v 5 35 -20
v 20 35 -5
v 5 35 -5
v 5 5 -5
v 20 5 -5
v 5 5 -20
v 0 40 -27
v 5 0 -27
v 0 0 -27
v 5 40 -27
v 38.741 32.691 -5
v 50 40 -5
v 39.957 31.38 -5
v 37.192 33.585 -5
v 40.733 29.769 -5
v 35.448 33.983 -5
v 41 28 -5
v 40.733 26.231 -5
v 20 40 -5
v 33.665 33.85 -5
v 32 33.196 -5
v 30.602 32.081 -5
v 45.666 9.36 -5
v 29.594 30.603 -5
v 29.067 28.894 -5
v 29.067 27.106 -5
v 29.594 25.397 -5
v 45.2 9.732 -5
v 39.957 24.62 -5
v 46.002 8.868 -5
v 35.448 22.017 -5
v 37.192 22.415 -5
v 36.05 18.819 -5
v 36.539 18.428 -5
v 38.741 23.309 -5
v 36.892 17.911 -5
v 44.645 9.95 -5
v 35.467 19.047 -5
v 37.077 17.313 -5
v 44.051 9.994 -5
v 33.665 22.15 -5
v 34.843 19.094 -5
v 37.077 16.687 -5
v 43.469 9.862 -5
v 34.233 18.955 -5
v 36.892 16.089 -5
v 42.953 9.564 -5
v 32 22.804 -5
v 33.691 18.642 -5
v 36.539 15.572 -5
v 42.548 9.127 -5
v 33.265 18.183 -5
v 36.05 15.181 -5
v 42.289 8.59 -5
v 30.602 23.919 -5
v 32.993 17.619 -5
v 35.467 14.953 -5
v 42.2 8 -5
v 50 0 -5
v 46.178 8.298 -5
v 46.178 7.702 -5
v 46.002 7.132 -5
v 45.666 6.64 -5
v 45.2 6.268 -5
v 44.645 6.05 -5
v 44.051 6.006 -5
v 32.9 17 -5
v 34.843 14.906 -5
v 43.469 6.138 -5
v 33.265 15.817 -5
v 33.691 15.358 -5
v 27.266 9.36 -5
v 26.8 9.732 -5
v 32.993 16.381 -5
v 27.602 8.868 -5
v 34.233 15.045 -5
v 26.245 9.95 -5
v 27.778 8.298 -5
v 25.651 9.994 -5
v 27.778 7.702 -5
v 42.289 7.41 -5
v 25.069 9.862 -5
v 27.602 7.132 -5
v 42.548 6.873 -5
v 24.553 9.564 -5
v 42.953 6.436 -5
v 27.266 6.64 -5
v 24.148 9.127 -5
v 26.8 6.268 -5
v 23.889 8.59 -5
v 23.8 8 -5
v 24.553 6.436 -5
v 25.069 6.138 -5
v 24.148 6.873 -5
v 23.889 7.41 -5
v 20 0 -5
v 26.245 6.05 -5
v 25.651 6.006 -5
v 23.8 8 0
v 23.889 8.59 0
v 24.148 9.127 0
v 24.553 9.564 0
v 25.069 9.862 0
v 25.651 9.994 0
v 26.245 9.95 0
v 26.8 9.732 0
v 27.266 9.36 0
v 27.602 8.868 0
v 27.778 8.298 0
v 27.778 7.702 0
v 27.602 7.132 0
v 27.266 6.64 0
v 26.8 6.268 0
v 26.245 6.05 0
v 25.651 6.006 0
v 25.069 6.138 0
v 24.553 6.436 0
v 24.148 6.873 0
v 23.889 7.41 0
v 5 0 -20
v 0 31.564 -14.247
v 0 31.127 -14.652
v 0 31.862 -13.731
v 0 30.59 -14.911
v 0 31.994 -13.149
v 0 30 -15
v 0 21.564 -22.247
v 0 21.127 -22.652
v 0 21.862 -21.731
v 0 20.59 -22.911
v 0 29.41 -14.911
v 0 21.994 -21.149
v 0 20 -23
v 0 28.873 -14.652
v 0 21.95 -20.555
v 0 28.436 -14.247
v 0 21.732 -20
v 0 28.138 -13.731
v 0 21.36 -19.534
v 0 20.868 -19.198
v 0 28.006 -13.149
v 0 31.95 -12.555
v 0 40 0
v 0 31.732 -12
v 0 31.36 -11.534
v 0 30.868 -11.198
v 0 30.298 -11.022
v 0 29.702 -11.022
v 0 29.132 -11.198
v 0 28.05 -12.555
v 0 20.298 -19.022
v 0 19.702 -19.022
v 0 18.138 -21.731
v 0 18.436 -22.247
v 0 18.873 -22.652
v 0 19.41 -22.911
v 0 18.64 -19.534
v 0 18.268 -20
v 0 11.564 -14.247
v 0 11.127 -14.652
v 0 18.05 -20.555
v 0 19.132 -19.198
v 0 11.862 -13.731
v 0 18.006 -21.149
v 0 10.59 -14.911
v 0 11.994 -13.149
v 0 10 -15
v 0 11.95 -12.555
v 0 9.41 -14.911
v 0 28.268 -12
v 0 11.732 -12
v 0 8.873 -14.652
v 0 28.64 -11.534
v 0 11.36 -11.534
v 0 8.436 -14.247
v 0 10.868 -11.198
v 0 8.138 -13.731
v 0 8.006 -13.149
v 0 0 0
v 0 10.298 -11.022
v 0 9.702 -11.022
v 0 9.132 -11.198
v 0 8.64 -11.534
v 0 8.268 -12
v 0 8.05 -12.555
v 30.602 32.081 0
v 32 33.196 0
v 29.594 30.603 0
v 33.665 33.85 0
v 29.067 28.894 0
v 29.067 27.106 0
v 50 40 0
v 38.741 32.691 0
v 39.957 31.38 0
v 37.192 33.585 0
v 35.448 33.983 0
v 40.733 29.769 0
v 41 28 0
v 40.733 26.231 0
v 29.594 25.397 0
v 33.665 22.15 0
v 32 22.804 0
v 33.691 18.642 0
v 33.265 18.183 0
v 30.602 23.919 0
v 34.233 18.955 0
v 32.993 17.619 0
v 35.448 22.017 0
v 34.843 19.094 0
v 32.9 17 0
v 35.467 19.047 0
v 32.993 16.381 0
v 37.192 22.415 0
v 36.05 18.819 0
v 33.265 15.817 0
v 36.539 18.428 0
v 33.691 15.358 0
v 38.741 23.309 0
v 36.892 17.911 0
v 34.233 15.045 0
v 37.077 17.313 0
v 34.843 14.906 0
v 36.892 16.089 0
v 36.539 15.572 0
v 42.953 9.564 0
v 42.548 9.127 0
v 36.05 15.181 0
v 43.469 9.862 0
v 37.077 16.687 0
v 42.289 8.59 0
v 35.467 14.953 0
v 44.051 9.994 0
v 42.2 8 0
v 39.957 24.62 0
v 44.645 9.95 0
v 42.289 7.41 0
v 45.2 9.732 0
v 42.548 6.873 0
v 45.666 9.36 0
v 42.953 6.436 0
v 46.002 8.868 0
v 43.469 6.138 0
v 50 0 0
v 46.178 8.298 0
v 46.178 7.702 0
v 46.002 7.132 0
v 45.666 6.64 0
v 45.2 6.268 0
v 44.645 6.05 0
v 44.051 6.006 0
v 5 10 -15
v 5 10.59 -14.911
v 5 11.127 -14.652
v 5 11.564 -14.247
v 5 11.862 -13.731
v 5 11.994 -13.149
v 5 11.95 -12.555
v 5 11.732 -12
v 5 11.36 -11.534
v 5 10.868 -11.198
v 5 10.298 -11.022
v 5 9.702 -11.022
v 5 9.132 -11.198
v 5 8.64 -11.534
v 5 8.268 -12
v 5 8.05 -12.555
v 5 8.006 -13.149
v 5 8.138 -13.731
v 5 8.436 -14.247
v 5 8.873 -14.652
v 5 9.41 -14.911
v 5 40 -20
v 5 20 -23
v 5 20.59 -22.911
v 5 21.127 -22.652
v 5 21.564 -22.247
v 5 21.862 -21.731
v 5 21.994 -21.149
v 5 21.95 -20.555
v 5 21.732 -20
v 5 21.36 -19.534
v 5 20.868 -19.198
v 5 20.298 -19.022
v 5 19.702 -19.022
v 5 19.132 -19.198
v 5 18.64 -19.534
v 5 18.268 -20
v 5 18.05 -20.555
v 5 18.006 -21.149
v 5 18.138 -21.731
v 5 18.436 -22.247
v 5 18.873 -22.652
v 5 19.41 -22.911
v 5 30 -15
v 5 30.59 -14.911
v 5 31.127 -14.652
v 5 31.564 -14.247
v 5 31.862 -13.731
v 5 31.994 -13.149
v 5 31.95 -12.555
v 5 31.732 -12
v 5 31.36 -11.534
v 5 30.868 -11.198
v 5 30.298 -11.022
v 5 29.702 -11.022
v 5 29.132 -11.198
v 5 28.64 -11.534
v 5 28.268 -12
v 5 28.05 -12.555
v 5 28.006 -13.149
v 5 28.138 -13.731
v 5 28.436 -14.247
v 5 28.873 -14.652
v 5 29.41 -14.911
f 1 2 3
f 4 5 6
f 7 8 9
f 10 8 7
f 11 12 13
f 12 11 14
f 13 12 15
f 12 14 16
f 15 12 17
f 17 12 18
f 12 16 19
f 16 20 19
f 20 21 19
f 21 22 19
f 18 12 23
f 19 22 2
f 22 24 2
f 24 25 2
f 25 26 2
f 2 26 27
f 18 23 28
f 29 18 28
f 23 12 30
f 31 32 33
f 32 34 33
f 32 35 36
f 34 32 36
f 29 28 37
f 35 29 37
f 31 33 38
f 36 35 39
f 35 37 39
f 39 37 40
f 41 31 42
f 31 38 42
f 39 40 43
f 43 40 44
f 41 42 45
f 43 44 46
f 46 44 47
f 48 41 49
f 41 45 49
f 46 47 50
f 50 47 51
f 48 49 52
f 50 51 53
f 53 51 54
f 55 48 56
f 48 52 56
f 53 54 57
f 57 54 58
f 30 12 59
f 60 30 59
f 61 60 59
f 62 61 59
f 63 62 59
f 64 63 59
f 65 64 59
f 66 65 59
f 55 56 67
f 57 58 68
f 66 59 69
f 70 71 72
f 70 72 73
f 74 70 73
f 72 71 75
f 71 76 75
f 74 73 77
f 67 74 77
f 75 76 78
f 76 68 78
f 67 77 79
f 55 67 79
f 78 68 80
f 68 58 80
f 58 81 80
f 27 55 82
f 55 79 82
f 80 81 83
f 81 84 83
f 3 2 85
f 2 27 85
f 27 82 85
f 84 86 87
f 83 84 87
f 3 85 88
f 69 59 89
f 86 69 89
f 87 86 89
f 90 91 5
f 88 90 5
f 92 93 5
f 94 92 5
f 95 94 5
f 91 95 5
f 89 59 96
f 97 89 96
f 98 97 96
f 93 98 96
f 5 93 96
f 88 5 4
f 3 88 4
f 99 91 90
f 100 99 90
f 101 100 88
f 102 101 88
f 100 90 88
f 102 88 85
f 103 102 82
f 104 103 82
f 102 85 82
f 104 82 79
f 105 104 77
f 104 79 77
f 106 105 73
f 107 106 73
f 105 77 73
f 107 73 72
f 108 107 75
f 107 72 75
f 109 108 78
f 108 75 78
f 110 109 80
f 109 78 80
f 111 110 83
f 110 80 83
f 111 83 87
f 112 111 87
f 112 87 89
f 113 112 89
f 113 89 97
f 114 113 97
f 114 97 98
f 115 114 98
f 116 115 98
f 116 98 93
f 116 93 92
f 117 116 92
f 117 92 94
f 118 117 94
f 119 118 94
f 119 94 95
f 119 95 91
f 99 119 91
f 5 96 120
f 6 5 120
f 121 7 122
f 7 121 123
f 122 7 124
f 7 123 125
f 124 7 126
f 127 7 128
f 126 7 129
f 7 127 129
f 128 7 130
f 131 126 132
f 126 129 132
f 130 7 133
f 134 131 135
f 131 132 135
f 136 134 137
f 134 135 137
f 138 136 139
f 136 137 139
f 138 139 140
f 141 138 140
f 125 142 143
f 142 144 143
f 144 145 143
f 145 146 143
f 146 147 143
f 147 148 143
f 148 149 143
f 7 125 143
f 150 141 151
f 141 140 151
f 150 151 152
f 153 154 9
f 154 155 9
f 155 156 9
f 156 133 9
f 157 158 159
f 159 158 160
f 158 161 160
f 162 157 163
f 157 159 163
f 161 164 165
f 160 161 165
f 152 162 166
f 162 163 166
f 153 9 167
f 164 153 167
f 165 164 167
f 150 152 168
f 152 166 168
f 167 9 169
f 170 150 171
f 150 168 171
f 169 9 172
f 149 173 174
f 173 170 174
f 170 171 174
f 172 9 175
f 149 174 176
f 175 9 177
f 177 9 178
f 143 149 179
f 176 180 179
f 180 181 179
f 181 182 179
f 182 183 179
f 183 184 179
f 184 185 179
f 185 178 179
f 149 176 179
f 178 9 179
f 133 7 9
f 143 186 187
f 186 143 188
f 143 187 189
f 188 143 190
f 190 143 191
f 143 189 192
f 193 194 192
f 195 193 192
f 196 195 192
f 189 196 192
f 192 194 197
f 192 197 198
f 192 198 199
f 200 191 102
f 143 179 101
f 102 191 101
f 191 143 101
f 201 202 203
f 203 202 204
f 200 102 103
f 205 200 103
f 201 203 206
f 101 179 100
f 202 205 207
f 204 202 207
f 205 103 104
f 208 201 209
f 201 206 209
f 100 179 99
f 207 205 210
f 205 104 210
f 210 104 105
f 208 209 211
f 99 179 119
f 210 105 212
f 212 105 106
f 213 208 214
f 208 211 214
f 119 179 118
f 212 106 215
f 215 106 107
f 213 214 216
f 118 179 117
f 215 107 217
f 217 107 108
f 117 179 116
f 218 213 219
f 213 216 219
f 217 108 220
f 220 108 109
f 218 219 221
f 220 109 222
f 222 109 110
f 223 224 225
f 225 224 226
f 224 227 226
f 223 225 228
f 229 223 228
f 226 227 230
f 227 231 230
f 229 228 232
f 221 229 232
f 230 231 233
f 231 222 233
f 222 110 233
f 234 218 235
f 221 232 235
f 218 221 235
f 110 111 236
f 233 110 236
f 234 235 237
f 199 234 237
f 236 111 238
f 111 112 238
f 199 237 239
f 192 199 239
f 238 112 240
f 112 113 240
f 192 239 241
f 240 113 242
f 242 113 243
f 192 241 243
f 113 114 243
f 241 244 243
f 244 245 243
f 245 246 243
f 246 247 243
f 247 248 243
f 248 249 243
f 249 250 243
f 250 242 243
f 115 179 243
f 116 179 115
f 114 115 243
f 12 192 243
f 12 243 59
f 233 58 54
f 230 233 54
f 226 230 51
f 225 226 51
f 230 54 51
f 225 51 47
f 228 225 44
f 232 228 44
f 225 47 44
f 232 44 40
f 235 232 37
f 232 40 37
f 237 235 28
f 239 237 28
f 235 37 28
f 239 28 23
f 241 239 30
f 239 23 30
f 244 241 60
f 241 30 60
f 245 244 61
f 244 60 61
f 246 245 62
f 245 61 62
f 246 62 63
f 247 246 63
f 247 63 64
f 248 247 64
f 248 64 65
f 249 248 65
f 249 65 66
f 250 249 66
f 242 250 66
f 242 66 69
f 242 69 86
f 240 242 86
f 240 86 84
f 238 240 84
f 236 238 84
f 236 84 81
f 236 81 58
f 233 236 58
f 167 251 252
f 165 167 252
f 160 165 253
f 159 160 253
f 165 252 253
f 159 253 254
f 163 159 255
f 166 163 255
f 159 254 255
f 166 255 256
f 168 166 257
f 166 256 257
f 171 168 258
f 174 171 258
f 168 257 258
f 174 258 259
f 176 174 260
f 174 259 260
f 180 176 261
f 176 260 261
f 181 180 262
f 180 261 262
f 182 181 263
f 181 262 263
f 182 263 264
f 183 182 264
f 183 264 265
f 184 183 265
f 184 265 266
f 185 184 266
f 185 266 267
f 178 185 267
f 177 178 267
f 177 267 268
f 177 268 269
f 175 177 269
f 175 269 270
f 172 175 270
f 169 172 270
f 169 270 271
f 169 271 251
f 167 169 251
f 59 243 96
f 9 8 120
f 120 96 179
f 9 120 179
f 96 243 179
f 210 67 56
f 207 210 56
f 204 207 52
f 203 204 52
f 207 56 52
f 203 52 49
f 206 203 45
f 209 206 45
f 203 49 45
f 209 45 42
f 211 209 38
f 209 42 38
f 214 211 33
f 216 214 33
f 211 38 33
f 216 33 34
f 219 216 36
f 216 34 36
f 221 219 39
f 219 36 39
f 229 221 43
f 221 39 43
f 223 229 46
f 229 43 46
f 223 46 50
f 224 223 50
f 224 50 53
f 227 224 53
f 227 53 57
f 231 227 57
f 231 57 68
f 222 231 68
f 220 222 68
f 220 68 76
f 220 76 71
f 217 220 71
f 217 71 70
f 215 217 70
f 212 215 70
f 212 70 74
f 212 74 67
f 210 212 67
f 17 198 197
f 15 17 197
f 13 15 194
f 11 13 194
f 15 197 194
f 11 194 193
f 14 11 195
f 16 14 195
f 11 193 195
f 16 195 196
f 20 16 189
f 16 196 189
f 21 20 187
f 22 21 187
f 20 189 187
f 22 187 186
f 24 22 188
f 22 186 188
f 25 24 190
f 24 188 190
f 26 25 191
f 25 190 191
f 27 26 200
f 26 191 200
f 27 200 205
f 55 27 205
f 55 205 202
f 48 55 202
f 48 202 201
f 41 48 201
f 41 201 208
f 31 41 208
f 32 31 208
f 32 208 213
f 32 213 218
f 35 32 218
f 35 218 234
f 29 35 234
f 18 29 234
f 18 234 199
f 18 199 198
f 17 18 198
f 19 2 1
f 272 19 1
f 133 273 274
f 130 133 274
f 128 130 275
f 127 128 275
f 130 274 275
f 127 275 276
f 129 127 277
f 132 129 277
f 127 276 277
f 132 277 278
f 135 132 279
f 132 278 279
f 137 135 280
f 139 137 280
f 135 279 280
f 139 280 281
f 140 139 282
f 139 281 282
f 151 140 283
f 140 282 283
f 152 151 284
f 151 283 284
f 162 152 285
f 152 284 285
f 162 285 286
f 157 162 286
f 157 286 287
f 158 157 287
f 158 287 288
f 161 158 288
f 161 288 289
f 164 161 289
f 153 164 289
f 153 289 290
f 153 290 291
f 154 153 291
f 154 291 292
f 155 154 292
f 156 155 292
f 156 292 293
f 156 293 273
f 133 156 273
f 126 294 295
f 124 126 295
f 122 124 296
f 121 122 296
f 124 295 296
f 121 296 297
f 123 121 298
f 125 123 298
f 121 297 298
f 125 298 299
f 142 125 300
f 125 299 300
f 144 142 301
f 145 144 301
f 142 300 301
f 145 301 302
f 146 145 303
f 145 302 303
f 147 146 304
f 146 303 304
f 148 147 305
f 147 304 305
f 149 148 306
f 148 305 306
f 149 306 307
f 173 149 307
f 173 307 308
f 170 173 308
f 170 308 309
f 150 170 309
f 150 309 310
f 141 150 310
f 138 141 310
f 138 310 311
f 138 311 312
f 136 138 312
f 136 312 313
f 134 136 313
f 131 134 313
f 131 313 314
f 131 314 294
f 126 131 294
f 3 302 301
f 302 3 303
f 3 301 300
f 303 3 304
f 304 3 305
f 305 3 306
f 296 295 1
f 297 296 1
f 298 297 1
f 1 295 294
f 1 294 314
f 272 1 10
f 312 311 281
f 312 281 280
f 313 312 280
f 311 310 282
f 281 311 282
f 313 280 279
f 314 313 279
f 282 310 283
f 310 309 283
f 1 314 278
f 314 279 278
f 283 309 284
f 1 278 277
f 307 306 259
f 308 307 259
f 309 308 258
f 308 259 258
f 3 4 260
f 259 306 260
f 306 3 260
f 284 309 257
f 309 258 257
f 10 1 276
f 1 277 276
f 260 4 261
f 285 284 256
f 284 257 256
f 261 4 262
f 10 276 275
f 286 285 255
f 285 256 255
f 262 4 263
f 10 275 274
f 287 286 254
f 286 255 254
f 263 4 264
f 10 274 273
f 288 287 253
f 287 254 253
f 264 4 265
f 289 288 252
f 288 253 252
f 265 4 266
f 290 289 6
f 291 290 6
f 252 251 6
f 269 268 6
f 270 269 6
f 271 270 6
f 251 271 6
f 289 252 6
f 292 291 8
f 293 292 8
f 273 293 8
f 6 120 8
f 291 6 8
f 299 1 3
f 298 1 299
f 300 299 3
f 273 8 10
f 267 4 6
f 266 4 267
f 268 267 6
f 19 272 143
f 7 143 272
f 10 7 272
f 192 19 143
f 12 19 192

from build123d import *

# Parameters (mm, degrees)
BOSS_EXTRUDE1_DEPTH = 40
CUT_EXTRUDE1_DEPTH  = 35
BOSS_EXTRUDE2_DEPTH = 5
SKETCH6_R           = 2
CUT_EXTRUDE2_DEPTH  = 70.641941386
SKETCH7_R           = 3.2
SKETCH7_R_2         = 2.1
SKETCH7_R_3         = 2
CUT_EXTRUDE4_DEPTH  = 18.4
SKETCH9_R           = 5.05
CUT_EXTRUDE5_DEPTH  = 3
SKETCH10_R          = 6
CUT_EXTRUDE6_DEPTH  = 73.972597597
SKETCH11_W          = 8
SKETCH11_H          = 40
CUT_EXTRUDE7_DEPTH  = 70.641941386


with BuildPart() as part:
    # Sketch1 → Boss-Extrude1 (new body)
    with BuildSketch(Plane(origin=(0, 0, 0), x_dir=(1, 0, 0), z_dir=(0, 1, 0))):
        Polygon((0, 0), (50, 0), (50, 5), (20, 5), (5, 20), (5, 35), (0, 35), align=None)
    extrude(amount=BOSS_EXTRUDE1_DEPTH)

    # Sketch3 → Cut-Extrude1 (cut)
    with BuildSketch(Plane.XZ):
        Polygon((5, -20), (5, -5), (20, -5), align=None)
    extrude(amount=-CUT_EXTRUDE1_DEPTH, mode=Mode.SUBTRACT)

    # Sketch5 → Boss-Extrude2 (add)
    with BuildSketch(Plane.XZ):
        Polygon((5, -20), (5, -5), (20, -5), align=None)
    extrude(amount=-BOSS_EXTRUDE2_DEPTH)

    # Sketch6 → Cut-Extrude2 (cut, through all)
    with BuildSketch(Plane(origin=(5, 0, 0), x_dir=(0, 0, -1), z_dir=(1, 0, 0))):
        with Locations((13, 30)):
            Circle(SKETCH6_R)
        with Locations((13, 10)):
            Circle(SKETCH6_R)
        with Locations((21, 20)):
            Circle(SKETCH6_R)
    extrude(amount=-CUT_EXTRUDE2_DEPTH, mode=Mode.SUBTRACT)

    # Sketch7 → Cut-Extrude4 (cut)
    with BuildSketch(Plane(origin=(0, 0, -5), x_dir=(-1, 0, 0), z_dir=(0, 0, -1))):
        with Locations((-35, 28)):
            Circle(SKETCH7_R)
        with Locations((-35, 17)):
            Circle(SKETCH7_R_2)
        with Locations((-25.8, 8)):
            Circle(SKETCH7_R_3)
        with Locations((-44.2, 8)):
            Circle(SKETCH7_R_3)
    extrude(amount=-CUT_EXTRUDE4_DEPTH, mode=Mode.SUBTRACT)

    # Sketch9 → Cut-Extrude5 (cut)
    with BuildSketch(Plane.XY):
        with Locations((35, 28)):
            Circle(SKETCH9_R)
    extrude(amount=-CUT_EXTRUDE5_DEPTH, mode=Mode.SUBTRACT)

    # Sketch10 → Cut-Extrude6 (cut, through all)
    with BuildSketch(Plane.XY):
        with Locations((35, 28)):
            Circle(SKETCH10_R)
    extrude(amount=-CUT_EXTRUDE6_DEPTH, mode=Mode.SUBTRACT)

    # Sketch11 → Cut-Extrude7 (cut, through all)
    with BuildSketch(Plane(origin=(5, 0, 0), x_dir=(0, 0, -1), z_dir=(1, 0, 0))):
        with Locations((31, 20)):
            Rectangle(SKETCH11_W, SKETCH11_H)
    extrude(amount=-CUT_EXTRUDE7_DEPTH, mode=Mode.SUBTRACT)


solid = part.part
